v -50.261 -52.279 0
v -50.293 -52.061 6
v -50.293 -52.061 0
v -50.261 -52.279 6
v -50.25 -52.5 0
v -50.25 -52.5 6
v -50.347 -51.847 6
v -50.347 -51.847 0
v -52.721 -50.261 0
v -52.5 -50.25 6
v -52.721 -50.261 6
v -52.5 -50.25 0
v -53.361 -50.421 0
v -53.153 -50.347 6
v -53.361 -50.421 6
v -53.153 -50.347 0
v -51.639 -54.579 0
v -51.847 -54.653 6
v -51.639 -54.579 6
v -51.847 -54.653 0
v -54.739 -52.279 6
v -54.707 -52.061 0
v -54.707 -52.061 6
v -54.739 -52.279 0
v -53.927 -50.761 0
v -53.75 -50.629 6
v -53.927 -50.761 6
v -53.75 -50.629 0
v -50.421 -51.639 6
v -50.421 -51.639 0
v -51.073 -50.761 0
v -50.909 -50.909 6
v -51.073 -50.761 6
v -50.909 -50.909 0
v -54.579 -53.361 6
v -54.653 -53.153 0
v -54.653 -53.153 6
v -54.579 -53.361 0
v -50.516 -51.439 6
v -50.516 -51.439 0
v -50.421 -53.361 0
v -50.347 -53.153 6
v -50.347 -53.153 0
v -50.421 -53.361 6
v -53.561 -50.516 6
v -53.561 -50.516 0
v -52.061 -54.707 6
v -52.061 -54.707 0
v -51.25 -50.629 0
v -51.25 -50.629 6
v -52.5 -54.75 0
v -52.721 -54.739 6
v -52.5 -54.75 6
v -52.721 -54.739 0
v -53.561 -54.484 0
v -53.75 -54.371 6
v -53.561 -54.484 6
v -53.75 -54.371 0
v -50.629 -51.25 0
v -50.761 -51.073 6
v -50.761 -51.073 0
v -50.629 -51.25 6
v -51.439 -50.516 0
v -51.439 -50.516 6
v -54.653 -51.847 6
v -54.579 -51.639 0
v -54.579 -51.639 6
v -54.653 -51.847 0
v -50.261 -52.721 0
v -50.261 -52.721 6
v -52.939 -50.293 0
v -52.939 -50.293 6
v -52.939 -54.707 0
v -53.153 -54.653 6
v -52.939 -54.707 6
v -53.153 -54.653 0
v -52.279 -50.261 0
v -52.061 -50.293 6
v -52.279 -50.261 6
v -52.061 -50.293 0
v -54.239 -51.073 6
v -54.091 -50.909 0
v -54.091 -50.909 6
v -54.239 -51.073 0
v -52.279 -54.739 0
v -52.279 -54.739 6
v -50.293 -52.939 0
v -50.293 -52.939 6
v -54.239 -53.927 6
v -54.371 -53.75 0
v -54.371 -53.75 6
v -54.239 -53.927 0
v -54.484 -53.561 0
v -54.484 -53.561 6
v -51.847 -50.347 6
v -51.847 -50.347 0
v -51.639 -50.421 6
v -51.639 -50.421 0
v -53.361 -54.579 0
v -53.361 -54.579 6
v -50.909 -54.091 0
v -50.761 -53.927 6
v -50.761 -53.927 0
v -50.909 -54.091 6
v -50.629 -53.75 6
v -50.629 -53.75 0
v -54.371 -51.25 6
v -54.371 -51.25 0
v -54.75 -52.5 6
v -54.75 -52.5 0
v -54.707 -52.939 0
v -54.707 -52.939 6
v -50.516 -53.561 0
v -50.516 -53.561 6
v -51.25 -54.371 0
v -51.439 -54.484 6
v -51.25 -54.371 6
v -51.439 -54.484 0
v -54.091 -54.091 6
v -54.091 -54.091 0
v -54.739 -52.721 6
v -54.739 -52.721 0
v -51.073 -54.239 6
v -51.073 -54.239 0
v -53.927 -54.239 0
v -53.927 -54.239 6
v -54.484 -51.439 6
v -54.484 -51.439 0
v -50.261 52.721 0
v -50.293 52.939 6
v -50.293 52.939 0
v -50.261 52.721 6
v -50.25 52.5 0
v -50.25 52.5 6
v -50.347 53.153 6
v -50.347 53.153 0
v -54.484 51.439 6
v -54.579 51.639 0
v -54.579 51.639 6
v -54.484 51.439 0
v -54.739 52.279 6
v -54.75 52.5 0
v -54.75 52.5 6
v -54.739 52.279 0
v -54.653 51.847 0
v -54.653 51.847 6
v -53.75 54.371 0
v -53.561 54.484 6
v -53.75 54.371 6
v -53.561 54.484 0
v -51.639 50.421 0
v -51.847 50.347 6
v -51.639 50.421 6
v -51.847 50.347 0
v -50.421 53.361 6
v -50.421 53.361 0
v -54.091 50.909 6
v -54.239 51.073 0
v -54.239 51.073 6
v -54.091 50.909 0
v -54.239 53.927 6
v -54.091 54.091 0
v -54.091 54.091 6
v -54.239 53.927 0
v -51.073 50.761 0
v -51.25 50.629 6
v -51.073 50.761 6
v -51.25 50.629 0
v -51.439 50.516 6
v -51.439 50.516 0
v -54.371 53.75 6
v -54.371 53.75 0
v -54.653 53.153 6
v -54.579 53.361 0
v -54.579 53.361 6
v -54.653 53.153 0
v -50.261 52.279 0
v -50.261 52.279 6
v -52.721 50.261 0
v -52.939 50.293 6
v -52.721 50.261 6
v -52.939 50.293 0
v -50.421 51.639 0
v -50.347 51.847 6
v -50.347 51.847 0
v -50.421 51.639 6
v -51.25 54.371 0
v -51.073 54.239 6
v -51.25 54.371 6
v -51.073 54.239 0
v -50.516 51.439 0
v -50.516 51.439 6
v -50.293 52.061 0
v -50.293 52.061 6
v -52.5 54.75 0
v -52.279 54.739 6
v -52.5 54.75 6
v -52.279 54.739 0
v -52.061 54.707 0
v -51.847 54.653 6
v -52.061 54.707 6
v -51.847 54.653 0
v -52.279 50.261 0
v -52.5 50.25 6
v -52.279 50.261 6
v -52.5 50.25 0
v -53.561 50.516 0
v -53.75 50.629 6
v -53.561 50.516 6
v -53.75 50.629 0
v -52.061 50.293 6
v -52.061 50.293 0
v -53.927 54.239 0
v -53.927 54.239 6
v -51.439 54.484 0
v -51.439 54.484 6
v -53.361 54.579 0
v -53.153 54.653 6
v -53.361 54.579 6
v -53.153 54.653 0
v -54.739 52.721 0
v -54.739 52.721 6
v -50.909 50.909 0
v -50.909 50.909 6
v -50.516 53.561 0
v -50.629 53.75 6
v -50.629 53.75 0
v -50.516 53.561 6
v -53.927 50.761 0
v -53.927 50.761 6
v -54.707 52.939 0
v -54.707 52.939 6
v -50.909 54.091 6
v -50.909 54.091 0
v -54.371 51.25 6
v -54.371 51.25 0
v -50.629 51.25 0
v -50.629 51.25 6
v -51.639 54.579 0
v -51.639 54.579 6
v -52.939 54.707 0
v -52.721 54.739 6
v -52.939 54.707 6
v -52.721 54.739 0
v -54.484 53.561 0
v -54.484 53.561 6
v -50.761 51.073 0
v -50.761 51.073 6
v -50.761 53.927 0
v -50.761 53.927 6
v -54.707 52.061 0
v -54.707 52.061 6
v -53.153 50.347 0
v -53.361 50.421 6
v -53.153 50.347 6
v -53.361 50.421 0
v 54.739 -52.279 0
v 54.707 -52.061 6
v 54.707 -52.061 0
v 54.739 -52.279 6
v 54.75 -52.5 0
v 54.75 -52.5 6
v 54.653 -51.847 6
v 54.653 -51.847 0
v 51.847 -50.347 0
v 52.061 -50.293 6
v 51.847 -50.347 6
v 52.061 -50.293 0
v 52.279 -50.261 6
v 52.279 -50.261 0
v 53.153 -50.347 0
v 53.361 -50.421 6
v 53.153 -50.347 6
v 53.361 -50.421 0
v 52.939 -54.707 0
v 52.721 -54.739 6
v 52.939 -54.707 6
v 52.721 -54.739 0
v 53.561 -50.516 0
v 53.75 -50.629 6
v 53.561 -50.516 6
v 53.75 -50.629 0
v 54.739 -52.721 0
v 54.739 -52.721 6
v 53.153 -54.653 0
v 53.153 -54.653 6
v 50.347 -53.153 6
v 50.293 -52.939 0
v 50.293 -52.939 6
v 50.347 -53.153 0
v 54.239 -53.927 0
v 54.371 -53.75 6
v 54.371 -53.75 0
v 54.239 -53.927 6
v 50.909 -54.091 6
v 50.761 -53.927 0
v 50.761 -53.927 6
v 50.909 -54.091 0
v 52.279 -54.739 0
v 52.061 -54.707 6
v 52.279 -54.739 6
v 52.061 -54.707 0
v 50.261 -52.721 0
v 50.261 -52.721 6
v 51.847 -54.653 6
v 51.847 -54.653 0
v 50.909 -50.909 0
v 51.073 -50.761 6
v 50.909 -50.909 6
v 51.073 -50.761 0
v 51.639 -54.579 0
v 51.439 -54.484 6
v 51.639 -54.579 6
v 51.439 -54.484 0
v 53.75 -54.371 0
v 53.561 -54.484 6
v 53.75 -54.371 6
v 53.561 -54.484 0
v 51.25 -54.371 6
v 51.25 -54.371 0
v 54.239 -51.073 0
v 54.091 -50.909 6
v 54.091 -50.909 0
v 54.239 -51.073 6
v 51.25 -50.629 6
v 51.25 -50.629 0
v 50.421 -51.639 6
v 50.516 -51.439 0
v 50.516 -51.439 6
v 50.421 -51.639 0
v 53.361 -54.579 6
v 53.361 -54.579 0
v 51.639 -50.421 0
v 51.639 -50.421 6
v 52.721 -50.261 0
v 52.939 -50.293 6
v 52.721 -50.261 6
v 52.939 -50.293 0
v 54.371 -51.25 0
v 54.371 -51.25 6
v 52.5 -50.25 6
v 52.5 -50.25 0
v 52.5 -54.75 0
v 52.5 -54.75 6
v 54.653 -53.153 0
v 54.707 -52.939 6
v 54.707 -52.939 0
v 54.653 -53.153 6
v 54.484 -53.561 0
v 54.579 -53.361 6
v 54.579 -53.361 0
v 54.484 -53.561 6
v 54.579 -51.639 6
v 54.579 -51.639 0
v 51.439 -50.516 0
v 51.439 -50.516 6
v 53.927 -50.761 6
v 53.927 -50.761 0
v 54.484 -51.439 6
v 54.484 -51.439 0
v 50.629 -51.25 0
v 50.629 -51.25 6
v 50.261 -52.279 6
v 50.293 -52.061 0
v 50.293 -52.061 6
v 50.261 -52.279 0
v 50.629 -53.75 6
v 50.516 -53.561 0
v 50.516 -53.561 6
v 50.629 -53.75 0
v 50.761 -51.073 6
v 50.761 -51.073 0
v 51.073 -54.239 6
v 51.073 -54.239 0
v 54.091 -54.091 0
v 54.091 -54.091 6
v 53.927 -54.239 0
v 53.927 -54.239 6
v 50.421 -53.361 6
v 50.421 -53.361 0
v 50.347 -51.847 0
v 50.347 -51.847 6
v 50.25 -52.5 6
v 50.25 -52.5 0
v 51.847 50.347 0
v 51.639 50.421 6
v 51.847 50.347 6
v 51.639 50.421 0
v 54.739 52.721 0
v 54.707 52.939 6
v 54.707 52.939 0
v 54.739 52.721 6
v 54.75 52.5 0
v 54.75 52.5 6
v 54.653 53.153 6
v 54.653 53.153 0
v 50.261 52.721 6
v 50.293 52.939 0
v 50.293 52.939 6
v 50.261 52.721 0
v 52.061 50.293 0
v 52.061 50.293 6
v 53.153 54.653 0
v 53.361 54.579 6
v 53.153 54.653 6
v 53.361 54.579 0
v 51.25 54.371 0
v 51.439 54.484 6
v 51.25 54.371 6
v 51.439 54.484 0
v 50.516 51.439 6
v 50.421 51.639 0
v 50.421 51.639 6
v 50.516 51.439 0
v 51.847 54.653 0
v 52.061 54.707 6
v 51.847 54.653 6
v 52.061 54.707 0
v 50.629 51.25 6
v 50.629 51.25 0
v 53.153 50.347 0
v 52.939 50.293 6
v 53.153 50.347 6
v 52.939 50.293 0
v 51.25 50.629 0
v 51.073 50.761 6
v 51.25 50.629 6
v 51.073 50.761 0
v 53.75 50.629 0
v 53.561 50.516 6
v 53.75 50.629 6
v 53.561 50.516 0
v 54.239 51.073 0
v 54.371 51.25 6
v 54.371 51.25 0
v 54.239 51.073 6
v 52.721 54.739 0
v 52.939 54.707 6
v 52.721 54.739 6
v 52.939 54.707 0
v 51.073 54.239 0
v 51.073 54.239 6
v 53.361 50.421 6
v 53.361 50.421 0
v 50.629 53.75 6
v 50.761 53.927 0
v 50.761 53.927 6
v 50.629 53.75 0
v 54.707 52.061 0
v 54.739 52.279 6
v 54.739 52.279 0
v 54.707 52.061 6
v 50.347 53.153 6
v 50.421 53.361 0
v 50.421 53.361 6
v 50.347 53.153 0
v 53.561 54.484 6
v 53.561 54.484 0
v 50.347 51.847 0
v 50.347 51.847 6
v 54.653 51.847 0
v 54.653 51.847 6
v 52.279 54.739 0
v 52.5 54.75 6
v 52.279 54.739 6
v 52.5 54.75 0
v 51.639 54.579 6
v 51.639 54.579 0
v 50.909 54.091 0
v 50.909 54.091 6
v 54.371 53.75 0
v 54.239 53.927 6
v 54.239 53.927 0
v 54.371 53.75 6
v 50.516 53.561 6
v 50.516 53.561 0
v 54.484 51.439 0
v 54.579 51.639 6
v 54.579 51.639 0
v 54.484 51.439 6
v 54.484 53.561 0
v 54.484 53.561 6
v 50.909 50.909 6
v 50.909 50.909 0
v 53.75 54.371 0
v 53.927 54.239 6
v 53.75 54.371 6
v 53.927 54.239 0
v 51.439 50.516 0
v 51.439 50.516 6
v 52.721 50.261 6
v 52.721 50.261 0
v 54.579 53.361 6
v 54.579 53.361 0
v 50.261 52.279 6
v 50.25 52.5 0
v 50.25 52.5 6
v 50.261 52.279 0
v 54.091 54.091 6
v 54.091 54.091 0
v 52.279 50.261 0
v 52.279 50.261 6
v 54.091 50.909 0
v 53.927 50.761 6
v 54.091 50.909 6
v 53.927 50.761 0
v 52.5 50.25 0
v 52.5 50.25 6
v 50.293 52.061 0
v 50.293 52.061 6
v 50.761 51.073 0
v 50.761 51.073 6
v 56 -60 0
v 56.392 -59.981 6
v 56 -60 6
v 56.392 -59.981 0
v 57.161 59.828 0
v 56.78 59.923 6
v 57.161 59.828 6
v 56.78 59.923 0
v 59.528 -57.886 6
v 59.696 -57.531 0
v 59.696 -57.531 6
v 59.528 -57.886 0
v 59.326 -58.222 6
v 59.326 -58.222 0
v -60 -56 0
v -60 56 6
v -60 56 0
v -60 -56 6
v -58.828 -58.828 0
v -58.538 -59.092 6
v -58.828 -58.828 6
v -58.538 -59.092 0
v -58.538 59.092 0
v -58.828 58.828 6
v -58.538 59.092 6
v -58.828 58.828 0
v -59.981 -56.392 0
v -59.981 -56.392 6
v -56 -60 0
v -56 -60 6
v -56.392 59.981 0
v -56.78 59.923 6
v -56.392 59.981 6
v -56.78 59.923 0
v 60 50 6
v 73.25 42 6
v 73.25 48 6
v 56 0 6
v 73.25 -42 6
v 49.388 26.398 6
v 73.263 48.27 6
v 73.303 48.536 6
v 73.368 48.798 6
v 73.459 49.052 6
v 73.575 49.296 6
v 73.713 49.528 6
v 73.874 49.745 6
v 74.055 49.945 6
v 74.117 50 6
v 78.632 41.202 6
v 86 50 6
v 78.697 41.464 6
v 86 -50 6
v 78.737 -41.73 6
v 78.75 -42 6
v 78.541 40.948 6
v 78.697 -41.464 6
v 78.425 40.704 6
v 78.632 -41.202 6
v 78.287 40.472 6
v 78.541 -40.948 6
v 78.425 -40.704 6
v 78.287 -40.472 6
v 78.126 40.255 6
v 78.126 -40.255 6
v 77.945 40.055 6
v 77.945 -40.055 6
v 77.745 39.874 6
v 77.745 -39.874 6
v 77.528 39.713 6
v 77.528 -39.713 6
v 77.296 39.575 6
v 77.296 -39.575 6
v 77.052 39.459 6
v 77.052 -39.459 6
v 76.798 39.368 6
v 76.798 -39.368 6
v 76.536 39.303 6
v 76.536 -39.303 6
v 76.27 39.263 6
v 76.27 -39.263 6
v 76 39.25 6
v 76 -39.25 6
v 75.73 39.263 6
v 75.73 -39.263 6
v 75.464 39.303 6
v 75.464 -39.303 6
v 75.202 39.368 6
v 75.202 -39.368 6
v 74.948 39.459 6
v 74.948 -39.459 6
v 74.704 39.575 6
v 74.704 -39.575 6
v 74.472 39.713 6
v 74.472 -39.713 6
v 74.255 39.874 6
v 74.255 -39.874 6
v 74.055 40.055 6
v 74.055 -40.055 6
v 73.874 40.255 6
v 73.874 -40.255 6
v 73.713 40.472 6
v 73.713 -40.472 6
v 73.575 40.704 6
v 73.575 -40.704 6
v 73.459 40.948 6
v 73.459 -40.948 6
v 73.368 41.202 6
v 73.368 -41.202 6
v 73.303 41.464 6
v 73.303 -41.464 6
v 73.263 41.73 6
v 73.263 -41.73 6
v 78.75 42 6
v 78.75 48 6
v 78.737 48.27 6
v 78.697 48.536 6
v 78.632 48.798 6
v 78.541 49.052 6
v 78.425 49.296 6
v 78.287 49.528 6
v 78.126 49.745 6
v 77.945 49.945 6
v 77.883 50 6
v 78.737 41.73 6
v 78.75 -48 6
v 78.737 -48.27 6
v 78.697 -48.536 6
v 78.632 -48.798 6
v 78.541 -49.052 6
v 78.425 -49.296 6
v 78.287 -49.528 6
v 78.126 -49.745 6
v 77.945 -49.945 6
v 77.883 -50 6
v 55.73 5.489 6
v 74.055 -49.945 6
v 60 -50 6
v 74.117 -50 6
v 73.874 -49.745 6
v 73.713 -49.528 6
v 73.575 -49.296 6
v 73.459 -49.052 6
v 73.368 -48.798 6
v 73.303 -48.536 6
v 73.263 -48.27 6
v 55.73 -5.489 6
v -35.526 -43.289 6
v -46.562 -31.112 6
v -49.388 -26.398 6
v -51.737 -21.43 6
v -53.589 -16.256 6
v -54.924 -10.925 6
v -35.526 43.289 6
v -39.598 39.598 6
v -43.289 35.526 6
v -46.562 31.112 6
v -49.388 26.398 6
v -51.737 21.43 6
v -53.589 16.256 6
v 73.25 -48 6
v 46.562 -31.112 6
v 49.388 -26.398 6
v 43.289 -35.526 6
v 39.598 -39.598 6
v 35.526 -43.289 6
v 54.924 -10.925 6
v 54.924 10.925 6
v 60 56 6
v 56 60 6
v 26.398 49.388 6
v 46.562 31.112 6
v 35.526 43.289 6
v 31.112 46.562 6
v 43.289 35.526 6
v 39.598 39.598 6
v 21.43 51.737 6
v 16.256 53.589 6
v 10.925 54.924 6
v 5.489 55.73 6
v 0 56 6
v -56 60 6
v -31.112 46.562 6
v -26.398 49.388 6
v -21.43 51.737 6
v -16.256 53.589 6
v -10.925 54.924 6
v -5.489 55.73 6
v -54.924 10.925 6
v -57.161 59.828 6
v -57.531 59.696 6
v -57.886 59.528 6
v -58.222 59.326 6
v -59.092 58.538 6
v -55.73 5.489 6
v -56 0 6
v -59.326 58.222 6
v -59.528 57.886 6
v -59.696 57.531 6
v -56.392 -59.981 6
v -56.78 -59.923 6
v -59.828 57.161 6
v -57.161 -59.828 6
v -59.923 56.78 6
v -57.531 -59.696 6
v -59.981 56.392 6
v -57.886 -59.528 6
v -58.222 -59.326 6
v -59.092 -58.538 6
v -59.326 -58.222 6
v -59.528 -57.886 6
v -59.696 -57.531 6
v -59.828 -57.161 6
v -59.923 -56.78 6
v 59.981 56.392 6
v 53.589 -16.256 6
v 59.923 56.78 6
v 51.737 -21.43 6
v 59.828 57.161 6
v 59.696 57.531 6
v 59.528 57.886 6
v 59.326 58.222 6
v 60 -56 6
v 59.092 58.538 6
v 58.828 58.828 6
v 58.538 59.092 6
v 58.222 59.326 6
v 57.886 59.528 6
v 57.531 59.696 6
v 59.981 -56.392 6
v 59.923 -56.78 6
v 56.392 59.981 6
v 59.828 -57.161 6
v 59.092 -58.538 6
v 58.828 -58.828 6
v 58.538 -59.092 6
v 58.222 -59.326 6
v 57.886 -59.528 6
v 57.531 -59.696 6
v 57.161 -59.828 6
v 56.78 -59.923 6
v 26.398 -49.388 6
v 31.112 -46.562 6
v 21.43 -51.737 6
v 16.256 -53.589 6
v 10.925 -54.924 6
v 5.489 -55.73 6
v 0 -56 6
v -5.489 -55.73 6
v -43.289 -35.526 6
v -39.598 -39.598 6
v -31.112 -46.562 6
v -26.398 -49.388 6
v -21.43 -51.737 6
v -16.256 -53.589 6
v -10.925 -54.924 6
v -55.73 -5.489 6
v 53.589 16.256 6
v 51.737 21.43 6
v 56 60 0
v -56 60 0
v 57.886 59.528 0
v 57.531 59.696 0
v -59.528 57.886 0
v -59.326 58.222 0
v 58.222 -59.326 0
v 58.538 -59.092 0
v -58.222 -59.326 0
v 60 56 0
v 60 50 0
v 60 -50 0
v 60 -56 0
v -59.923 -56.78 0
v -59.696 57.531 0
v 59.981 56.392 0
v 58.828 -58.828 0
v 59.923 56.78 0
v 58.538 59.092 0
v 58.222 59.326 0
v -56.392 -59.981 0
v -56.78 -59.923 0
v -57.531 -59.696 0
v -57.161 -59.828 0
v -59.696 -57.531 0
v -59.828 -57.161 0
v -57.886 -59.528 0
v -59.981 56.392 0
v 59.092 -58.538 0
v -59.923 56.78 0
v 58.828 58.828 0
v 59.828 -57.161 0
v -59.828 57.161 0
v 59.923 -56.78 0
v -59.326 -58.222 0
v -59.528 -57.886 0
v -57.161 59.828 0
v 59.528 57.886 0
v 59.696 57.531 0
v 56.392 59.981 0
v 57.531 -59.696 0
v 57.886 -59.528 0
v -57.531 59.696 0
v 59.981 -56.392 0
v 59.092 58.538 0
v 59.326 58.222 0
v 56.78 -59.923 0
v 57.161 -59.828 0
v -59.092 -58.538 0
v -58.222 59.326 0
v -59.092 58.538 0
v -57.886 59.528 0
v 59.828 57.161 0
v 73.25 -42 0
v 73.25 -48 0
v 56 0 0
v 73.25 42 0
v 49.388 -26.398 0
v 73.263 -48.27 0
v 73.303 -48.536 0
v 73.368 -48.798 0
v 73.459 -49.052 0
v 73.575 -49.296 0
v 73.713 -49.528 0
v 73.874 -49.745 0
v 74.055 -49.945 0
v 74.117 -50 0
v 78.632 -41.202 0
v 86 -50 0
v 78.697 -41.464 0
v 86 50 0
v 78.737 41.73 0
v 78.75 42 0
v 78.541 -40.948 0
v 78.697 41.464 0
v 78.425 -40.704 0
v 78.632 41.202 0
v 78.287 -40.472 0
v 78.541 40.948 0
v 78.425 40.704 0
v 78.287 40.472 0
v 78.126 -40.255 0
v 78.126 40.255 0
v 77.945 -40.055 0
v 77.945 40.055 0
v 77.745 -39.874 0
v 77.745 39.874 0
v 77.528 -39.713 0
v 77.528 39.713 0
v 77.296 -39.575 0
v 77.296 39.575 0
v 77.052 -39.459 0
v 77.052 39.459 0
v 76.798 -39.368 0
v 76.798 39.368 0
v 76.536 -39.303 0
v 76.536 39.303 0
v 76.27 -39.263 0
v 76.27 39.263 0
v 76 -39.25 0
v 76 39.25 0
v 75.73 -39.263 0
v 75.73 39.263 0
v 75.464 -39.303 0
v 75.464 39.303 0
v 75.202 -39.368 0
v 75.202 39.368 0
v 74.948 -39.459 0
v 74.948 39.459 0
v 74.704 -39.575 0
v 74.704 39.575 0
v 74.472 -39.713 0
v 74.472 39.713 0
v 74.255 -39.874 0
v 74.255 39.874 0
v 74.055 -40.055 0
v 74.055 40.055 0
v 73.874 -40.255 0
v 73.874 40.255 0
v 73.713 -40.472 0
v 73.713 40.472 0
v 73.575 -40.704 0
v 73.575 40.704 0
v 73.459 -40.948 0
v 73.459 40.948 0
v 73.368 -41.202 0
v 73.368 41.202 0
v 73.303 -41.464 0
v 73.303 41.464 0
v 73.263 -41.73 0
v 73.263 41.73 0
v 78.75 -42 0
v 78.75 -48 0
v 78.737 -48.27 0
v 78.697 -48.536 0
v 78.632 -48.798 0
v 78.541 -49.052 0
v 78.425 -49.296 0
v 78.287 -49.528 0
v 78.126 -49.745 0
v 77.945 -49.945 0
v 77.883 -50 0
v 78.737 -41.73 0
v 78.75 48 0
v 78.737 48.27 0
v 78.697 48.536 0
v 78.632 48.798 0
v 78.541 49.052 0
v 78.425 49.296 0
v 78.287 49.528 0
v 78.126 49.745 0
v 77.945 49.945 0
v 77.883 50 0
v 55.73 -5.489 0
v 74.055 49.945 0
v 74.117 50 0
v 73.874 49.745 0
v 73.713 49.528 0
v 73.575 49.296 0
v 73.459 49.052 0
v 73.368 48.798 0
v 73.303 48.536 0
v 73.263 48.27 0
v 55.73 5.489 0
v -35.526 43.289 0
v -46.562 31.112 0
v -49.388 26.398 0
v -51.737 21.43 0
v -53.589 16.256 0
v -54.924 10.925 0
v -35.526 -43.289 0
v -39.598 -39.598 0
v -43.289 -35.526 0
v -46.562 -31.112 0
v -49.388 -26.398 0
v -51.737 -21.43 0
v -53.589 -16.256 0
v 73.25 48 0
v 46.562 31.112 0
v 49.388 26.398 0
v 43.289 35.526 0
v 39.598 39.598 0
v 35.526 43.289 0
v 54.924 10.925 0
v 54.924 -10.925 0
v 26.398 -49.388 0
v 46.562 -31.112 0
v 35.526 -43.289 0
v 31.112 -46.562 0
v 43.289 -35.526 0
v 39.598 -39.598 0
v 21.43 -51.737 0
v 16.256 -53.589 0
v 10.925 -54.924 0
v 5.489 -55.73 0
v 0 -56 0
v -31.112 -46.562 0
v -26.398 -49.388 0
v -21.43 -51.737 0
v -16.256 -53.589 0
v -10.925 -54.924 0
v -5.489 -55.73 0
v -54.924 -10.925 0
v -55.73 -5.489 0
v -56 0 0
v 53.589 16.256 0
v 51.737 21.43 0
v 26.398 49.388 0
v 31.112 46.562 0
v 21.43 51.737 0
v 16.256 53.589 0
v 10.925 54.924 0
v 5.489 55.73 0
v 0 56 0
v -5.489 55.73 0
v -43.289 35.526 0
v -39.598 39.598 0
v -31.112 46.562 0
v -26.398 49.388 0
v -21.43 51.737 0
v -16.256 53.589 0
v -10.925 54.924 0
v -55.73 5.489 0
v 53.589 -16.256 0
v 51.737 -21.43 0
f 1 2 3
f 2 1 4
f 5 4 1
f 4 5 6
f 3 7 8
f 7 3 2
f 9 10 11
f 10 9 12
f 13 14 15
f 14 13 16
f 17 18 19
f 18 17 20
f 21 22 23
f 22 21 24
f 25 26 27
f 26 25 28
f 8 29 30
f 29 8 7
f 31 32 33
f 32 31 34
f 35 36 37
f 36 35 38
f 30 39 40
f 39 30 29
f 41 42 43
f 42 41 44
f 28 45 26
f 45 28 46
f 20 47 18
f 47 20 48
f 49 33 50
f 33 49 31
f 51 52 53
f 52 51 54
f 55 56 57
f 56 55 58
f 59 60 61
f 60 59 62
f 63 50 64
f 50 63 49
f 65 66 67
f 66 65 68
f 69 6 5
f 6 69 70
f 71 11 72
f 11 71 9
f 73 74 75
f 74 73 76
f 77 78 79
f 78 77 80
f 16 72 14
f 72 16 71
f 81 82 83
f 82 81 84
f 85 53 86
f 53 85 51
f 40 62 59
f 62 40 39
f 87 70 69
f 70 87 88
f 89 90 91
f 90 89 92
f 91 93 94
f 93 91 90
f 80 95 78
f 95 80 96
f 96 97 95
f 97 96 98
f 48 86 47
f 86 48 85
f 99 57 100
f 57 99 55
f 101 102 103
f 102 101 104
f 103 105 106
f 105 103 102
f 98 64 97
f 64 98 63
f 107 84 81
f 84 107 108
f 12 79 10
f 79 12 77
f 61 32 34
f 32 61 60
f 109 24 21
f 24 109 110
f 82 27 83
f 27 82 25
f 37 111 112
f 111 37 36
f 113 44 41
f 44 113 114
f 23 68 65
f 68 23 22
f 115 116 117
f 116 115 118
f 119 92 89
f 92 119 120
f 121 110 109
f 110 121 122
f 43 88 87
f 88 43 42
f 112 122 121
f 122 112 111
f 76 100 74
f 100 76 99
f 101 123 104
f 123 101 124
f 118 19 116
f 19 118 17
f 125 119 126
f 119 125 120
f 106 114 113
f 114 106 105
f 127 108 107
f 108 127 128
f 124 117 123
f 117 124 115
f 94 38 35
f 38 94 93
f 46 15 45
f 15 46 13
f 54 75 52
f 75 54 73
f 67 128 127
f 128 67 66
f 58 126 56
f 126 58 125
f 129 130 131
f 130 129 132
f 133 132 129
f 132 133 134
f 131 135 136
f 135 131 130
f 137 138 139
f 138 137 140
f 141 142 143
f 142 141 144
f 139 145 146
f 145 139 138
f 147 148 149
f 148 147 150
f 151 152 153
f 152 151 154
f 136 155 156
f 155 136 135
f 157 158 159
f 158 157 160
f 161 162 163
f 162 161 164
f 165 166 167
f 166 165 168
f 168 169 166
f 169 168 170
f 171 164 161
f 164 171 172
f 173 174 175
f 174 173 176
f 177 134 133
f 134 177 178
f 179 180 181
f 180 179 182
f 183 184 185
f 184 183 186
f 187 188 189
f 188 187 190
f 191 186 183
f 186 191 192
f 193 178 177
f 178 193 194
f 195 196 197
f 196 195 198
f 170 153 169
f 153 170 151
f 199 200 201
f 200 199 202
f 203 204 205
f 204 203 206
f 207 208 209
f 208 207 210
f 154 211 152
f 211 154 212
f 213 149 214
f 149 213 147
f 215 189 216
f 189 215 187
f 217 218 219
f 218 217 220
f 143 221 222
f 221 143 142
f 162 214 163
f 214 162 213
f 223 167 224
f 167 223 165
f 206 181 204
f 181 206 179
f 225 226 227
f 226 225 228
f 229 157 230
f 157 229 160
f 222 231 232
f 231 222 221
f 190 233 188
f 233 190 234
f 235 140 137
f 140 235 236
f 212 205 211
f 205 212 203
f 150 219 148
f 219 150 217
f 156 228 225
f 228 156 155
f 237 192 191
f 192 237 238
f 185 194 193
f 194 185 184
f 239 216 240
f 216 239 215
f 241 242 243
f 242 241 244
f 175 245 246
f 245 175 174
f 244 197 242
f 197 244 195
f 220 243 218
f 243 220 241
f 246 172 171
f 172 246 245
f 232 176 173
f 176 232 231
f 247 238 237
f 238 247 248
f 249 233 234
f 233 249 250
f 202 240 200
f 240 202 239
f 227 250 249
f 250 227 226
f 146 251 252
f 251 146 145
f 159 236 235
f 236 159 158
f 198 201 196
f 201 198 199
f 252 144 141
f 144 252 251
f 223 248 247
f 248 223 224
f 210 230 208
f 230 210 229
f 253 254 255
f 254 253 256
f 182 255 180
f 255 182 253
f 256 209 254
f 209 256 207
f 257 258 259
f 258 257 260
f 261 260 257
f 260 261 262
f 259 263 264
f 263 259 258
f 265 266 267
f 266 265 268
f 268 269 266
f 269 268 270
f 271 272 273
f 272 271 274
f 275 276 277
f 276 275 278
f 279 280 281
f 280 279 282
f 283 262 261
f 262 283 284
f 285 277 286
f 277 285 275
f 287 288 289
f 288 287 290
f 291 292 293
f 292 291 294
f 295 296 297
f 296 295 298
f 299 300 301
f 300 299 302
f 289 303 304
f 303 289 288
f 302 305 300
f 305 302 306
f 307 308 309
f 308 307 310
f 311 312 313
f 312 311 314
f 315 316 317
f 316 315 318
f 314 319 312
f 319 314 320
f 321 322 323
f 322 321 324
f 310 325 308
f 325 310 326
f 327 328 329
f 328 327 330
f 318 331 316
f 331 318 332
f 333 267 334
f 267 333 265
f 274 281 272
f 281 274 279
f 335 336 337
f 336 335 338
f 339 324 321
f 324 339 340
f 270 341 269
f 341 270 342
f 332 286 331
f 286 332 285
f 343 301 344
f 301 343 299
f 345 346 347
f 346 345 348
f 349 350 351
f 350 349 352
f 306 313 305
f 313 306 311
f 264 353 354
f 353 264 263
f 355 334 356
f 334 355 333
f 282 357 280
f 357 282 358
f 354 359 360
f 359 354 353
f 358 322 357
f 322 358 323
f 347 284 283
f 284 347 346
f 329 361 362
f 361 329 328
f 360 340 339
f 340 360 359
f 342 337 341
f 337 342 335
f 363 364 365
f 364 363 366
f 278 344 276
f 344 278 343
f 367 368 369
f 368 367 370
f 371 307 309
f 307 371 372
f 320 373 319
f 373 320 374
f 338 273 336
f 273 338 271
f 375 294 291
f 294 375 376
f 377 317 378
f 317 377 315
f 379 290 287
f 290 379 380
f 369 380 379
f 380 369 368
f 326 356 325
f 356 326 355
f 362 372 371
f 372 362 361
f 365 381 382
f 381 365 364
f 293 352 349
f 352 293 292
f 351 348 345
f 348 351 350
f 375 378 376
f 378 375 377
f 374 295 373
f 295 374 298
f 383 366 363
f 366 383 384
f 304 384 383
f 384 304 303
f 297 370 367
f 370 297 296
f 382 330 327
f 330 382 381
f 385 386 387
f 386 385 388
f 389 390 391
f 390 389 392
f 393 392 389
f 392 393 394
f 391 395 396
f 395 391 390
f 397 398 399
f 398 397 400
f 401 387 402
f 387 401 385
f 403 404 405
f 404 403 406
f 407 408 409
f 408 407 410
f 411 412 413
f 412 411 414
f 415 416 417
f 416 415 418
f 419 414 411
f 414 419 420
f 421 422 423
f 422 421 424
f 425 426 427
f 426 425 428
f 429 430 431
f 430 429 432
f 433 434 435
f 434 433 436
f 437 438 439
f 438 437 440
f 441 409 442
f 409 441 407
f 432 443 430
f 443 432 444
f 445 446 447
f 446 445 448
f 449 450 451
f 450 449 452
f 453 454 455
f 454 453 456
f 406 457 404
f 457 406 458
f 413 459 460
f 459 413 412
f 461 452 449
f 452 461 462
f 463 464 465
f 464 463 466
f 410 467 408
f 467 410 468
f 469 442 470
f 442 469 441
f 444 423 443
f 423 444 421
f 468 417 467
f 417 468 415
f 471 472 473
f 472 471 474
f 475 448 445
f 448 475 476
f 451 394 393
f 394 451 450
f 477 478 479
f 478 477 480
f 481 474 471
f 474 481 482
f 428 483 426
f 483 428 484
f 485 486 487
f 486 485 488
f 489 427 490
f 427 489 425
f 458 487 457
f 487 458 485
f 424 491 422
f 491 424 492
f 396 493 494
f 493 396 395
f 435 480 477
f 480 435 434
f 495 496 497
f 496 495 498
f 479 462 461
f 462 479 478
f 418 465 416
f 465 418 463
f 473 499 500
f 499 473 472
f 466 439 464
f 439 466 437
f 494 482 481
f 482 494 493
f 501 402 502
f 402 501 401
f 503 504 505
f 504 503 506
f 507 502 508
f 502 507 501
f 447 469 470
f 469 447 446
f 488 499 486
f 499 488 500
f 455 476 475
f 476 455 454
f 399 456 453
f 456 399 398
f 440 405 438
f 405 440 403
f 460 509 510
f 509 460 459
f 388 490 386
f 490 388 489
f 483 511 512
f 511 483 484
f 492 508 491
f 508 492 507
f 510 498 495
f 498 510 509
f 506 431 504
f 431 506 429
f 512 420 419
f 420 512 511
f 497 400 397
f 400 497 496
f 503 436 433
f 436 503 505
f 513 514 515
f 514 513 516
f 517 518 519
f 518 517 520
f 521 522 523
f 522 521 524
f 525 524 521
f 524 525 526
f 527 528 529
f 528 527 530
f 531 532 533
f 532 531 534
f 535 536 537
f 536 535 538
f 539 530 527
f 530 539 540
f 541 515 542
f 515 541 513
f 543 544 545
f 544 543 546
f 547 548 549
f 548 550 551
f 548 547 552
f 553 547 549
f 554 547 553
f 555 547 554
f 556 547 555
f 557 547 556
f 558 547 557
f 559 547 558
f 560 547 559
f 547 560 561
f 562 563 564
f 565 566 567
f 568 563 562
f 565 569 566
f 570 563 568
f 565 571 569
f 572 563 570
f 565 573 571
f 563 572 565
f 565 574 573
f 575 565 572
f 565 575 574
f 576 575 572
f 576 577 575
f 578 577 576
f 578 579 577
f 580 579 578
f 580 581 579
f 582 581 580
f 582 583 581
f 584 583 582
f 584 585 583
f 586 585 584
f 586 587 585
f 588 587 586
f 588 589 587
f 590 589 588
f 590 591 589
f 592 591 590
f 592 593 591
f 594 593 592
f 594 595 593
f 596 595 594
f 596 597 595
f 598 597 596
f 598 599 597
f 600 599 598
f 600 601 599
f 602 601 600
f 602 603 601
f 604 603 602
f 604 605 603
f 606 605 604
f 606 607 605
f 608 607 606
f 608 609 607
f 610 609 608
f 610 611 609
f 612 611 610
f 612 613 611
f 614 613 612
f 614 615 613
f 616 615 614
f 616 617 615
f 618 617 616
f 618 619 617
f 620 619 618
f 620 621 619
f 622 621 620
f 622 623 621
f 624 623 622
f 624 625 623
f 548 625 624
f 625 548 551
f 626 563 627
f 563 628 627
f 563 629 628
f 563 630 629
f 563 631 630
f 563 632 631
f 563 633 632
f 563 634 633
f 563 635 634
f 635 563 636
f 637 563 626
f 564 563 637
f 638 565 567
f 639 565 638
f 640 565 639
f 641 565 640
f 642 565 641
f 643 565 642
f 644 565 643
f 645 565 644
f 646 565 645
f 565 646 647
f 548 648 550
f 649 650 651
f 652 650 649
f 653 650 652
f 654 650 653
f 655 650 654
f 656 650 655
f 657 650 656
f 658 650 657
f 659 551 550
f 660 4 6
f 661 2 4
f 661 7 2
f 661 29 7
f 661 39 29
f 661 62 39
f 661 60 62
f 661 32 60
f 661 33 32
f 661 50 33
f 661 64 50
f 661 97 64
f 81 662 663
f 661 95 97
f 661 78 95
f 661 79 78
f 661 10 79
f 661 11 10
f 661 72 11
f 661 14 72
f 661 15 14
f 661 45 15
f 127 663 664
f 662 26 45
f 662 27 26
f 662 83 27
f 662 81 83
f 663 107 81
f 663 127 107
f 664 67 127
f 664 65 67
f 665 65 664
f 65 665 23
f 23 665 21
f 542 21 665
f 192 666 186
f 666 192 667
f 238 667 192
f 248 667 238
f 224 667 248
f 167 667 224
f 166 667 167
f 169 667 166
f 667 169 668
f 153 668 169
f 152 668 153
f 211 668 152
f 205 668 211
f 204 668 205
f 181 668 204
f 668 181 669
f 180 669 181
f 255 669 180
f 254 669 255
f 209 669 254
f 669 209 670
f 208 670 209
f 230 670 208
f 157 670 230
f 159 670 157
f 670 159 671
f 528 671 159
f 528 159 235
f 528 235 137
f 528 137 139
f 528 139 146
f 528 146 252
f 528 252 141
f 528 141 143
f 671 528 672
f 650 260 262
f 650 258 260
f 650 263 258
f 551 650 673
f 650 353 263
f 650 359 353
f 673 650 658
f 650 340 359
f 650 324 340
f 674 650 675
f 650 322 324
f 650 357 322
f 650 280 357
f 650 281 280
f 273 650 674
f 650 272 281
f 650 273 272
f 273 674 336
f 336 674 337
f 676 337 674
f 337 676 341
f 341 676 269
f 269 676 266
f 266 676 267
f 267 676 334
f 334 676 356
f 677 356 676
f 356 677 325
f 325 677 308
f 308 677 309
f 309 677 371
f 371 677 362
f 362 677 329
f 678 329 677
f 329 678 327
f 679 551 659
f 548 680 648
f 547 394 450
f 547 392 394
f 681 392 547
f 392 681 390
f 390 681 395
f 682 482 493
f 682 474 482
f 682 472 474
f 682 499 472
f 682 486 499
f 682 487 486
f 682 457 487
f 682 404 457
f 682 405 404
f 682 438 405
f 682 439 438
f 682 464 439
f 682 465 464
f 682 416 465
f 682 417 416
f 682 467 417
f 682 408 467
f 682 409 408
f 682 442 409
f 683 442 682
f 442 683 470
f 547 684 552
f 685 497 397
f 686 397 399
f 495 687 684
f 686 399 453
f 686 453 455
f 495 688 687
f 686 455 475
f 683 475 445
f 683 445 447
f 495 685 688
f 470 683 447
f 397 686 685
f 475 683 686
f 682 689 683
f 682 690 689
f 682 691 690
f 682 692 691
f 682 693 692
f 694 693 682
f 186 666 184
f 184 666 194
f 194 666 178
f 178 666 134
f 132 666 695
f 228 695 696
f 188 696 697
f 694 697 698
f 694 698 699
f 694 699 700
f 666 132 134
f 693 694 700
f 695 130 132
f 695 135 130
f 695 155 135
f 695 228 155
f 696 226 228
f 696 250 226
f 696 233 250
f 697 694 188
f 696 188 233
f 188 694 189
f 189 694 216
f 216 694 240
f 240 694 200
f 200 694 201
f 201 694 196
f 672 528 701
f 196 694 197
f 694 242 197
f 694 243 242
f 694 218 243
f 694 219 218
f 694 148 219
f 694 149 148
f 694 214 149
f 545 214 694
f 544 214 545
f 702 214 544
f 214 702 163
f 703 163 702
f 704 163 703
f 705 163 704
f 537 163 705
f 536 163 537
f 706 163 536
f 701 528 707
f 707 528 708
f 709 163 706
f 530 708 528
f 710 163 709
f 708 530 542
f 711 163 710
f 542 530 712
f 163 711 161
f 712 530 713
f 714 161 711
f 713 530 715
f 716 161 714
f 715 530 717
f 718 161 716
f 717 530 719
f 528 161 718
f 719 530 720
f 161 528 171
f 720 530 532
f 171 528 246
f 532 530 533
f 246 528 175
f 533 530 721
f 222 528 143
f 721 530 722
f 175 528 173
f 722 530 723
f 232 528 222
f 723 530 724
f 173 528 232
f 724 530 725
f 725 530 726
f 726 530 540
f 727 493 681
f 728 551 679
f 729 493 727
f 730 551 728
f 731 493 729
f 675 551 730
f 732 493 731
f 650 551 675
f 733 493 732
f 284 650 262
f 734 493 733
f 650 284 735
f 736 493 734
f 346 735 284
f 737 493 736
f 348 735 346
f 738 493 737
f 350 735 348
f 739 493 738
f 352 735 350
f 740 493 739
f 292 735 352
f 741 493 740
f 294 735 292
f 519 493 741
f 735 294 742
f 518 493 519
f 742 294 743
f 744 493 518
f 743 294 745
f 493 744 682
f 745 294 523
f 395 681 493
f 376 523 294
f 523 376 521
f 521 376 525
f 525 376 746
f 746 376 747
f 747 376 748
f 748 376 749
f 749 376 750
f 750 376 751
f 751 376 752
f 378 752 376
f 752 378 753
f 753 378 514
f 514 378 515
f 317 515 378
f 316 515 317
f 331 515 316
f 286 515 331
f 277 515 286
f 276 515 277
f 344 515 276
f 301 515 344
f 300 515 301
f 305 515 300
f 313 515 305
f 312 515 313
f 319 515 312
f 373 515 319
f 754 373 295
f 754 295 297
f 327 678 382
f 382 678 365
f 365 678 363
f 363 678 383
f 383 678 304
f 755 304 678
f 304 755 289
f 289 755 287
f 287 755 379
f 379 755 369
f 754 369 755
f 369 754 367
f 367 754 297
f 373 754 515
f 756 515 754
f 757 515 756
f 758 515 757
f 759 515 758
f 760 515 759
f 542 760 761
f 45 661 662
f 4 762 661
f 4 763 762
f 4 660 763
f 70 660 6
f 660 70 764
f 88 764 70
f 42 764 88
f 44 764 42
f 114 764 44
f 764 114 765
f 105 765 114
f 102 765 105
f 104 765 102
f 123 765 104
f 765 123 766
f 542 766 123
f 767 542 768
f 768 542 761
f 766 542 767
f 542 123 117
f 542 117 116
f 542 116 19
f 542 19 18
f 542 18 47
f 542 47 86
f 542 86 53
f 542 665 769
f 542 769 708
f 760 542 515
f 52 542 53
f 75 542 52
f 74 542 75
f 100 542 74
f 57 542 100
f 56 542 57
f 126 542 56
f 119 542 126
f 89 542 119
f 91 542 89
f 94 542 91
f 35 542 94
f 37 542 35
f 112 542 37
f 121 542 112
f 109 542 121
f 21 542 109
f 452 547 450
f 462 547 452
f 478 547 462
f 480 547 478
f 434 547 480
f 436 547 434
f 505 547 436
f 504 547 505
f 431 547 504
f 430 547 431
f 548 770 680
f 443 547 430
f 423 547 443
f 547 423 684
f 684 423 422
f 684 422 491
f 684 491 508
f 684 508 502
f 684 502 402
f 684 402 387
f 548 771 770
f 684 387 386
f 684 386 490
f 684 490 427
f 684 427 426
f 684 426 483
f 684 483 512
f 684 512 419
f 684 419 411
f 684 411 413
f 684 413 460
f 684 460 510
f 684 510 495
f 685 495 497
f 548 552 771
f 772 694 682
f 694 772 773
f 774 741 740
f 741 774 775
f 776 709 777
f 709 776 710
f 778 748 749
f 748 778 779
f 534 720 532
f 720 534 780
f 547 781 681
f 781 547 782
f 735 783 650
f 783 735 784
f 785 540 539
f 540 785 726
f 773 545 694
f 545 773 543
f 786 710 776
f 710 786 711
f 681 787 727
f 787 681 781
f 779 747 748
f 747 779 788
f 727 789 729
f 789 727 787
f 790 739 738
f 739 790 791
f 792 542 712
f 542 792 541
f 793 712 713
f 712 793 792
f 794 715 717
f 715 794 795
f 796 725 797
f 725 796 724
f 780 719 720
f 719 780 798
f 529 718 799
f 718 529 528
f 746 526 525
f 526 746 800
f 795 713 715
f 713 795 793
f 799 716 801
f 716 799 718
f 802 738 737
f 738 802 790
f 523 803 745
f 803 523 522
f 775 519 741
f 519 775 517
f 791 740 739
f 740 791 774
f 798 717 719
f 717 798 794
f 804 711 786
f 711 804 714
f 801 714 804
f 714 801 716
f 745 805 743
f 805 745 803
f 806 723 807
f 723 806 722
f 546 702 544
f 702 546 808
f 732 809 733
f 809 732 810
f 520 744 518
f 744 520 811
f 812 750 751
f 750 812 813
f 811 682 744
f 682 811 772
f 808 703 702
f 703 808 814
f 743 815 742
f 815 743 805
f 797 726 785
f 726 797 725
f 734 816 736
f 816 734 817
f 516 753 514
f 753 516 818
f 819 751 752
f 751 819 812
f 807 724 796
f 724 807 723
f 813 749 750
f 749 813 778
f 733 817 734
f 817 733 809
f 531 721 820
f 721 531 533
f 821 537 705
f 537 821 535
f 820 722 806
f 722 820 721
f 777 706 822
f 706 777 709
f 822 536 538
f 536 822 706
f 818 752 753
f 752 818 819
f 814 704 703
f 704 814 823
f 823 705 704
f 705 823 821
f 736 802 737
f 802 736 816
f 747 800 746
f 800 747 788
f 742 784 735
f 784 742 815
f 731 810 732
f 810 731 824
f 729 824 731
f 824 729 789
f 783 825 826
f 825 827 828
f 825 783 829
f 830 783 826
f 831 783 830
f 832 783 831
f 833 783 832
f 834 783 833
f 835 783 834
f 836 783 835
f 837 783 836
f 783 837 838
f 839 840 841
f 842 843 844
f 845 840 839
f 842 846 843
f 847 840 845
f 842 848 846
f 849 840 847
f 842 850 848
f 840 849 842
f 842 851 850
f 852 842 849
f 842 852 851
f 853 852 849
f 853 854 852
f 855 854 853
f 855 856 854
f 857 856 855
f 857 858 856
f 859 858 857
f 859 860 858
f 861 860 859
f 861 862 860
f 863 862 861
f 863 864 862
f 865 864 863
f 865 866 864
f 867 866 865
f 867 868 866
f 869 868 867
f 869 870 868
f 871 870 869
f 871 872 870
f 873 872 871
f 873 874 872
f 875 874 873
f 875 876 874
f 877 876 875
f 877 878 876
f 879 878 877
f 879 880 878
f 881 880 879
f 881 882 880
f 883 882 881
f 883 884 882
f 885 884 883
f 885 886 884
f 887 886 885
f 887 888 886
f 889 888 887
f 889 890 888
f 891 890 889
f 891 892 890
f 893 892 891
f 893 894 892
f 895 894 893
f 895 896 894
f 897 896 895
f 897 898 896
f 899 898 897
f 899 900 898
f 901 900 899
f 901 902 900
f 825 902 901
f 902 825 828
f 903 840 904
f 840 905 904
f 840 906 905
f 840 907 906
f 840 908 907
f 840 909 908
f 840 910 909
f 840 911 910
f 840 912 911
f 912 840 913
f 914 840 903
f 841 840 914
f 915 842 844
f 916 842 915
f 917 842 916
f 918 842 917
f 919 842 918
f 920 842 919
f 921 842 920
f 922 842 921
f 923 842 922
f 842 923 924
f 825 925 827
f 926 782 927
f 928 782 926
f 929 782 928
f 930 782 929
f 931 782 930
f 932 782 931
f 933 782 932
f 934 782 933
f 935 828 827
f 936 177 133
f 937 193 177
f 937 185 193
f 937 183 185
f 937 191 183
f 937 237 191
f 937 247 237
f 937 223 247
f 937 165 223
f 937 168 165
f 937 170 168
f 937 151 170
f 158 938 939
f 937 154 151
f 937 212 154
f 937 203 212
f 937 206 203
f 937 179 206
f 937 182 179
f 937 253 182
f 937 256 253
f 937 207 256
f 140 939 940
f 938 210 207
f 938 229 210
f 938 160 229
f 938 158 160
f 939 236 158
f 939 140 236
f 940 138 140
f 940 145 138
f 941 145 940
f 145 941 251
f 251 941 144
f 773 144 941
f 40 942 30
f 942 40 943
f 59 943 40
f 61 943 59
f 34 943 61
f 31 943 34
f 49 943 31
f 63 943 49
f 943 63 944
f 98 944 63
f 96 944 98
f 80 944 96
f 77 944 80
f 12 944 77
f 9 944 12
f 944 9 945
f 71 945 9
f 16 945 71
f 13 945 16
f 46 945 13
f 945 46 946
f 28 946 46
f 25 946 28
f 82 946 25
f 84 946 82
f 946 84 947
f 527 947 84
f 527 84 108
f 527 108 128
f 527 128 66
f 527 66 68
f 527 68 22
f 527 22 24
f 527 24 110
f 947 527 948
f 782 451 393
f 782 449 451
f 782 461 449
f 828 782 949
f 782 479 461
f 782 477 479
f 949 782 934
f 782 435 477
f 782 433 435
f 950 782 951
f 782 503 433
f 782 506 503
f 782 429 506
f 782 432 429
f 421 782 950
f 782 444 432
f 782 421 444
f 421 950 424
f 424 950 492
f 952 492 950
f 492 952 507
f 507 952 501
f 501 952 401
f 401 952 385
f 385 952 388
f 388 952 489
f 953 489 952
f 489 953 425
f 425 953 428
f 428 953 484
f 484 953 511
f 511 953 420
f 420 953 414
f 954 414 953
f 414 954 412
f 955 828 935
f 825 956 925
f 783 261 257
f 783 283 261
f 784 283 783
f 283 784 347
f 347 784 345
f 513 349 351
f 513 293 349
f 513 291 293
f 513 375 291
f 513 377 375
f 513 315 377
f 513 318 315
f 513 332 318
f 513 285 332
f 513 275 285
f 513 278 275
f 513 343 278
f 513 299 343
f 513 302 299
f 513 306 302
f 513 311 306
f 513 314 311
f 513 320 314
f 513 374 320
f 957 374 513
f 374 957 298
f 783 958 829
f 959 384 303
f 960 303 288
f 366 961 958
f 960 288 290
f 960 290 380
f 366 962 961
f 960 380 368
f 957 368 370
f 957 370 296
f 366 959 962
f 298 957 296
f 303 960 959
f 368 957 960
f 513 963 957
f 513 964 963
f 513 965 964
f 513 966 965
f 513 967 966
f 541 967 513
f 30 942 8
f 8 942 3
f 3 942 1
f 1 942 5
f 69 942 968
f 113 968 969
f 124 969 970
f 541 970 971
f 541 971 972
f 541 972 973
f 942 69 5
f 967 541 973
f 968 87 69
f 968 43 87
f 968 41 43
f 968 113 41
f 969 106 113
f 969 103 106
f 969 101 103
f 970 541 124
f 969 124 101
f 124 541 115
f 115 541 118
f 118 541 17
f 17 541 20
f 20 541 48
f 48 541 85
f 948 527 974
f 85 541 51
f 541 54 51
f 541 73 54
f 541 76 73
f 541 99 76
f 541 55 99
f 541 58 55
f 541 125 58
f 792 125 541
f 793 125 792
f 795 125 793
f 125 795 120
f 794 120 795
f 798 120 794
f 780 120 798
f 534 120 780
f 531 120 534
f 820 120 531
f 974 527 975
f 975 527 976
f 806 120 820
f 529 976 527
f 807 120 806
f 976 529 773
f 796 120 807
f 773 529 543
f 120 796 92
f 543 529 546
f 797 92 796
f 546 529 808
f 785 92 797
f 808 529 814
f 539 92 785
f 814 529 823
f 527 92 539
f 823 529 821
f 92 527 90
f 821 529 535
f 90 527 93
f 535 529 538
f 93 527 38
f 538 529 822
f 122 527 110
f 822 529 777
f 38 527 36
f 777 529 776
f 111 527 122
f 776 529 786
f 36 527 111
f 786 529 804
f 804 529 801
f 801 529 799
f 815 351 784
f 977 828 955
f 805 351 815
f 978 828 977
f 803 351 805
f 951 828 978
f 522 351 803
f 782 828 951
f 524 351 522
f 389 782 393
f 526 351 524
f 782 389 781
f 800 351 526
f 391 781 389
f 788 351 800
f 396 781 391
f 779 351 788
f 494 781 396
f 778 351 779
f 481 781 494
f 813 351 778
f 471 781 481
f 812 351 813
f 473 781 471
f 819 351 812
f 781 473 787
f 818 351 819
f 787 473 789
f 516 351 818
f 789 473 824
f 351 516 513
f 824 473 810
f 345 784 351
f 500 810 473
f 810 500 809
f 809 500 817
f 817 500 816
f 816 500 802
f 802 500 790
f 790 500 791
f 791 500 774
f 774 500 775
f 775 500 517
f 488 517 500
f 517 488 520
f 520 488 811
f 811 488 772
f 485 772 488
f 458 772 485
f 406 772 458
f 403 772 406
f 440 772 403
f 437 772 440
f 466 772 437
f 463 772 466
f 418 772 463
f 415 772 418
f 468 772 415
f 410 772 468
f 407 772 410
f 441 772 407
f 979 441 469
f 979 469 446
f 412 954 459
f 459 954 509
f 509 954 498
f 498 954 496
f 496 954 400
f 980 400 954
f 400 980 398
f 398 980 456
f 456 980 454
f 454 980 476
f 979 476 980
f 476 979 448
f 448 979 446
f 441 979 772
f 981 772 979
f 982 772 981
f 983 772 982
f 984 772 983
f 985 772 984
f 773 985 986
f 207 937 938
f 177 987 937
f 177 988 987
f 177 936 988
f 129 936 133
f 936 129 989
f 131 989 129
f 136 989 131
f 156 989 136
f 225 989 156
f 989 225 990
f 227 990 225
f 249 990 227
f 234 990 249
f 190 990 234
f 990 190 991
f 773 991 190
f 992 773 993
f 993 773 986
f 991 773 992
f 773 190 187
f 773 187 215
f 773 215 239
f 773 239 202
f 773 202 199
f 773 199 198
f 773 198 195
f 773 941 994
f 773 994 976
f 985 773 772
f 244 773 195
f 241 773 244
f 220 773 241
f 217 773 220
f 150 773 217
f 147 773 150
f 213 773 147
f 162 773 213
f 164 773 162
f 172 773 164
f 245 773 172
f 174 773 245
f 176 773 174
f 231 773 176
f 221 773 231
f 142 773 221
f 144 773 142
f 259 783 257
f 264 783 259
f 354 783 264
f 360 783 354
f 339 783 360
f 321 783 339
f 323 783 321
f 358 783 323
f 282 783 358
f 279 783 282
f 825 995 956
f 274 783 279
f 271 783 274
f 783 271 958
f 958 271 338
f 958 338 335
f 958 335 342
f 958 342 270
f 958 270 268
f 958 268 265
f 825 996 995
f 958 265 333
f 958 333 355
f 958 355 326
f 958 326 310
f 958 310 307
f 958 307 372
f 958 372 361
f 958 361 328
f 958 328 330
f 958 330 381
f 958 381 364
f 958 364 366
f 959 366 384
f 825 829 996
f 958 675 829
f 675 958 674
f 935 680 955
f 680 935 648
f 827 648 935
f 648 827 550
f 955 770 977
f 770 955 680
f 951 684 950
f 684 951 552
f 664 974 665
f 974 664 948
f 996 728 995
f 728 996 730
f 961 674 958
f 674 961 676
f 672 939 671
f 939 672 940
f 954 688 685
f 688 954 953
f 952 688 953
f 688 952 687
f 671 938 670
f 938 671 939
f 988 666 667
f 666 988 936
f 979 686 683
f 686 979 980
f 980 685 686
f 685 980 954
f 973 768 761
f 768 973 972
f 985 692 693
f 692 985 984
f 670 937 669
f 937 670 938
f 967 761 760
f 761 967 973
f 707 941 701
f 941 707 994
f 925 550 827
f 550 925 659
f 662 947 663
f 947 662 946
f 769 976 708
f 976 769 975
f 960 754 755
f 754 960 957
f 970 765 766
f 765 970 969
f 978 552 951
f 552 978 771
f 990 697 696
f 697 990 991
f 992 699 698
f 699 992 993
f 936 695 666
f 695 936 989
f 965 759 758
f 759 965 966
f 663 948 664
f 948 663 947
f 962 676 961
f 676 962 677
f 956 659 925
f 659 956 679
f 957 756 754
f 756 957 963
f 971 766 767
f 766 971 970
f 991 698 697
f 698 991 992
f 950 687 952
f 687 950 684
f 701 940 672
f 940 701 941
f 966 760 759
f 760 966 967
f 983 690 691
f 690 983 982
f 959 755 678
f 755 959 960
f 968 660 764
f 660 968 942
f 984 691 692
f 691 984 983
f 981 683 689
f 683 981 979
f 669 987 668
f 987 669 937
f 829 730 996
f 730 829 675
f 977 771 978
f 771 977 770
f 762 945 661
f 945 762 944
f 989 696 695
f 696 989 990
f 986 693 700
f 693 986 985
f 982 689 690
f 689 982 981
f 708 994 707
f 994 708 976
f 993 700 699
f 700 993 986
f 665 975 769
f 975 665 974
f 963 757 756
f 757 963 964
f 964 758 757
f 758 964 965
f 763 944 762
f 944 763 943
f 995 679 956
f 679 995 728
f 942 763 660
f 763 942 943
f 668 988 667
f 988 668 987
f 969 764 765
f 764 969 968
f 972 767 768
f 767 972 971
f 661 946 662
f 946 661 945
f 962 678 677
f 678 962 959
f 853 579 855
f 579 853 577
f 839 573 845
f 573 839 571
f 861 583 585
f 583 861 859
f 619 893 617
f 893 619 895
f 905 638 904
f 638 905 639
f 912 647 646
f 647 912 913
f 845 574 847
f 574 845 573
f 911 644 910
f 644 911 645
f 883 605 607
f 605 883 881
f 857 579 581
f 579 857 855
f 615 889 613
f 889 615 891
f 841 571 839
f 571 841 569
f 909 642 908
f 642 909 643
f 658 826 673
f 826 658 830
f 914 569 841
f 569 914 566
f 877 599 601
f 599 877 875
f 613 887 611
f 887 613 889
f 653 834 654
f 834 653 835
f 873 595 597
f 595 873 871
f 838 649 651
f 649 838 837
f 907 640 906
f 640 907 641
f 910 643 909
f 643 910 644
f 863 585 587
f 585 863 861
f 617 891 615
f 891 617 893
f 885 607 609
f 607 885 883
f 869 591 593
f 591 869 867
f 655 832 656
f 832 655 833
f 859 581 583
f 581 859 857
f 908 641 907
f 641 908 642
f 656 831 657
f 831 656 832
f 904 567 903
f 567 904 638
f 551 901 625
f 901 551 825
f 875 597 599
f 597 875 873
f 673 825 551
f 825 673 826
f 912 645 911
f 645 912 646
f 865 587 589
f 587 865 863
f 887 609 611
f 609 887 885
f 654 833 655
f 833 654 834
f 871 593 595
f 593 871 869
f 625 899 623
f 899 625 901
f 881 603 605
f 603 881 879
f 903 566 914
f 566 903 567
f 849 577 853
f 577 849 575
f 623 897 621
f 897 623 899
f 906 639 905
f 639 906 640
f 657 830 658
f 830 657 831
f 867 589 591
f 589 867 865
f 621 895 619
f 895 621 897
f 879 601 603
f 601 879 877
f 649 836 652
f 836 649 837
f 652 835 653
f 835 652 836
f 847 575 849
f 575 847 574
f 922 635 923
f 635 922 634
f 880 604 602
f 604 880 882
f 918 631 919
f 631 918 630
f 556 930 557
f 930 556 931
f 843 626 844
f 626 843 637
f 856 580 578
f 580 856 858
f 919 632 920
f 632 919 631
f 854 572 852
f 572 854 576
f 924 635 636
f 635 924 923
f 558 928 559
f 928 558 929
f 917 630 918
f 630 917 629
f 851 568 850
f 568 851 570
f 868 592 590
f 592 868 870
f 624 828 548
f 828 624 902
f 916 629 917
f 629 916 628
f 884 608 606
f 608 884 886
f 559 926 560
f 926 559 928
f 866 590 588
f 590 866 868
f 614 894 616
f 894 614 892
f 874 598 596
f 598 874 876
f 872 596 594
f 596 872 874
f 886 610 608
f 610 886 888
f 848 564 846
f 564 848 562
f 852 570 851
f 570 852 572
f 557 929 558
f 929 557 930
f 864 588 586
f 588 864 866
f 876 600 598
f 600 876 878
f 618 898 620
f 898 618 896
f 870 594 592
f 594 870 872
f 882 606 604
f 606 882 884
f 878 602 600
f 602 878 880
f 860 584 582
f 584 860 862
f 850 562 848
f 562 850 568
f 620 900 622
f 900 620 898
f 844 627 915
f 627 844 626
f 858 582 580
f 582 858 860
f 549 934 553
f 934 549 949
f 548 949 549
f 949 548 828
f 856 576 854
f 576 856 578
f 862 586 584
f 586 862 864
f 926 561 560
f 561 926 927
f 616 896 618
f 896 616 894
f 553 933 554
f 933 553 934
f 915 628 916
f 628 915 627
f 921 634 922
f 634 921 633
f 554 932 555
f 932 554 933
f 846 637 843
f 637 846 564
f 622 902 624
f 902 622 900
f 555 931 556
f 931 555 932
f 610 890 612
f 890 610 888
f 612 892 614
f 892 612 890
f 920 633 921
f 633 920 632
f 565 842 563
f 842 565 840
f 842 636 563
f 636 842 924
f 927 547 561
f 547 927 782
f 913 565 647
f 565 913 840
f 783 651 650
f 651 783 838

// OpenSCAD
// file: config.scad
// ============================================================
//  config.scad — shared dimensions (single source of truth)
//  Every other file includes this. Change a number here and
//  the part files AND the assembly update together.
//  Units: mm.  Z is up.
// ============================================================

/* ----- rack ----- */
U       = 44.45;
span_U  = 6;
span    = span_U * U;        // 266.7 — spine length / mount span
post_t  = 4;
post_w  = 25;

/* ----- fan ----- */
fan_size  = 120;
fan_thick = 25;
fan_pitch = 105;
fan_hole_d = 4.5;            // M4 clearance (anti-vibration washers under the head)
bore_d    = 112;

/* ----- carrier ----- */
thickness       = 6;         // one thickness -> flat part (print or waterjet/CNC)
frame_corner_r  = 4;
gap_to_spine    = 6;
mount_bolt_d    = 5.5;       // M5 clearance into T-nuts
mount_bolt_span = 90;
slot_travel     = 6;
flange_height   = 100;

/* ----- spine (2020) ----- */
ext_width  = 20;

/* ----- fan heights along the rail ----- */
fan1_z = fan_size/2 + 5;
fan2_z = span - fan_size/2 - 5;

/* ----- derived placement (shared by carrier + spine + bracket) ----- */
spine_face_x   = fan_size/2 + gap_to_spine;   // 66
spine_center_x = spine_face_x + ext_width/2;  // 76
wing_x0        = fan_size/2 - 4;              // 56
wing_x1        = spine_face_x + ext_width;    // 86
post_x         = wing_x1 + 12;                // 98 (post inner face)

$fn = 64;
eps = 0.01;
// main file
// ============================================================
//  fan_carrier.scad — the part you fabricate (one per fan)
//  Flat profile: open frame + side wing. Print it, or cut from
//  sheet. Renders standalone here; the assembly `use`s carrier().
// ============================================================
include <config.scad>

module fan_frame() {
    difference() {
        linear_extrude(thickness)
            offset(r = frame_corner_r)
                square(fan_size - 2*frame_corner_r, center = true);
        translate([0, 0, -eps])
            cylinder(h = thickness + 2*eps, d = bore_d);
        for (sx = [-1, 1], sy = [-1, 1])
            translate([sx*fan_pitch/2, sy*fan_pitch/2, -eps])
                cylinder(h = thickness + 2*eps, d = fan_hole_d);
    }
}

module mount_wing() {
    difference() {
        translate([wing_x0, -flange_height/2, 0])
            cube([wing_x1 - wing_x0, flange_height, thickness]);
        for (sy = [-1, 1])
            translate([spine_center_x, sy*mount_bolt_span/2, -eps])
                hull() for (dy = [-slot_travel/2, slot_travel/2])
                    translate([0, dy, 0])
                        cylinder(h = thickness + 2*eps, d = mount_bolt_d);
    }
}

// s = "right" or "left" (mirror for the other rail)
module carrier(s = "right") {
    color("DarkOrange")
        scale([(s == "right") ? 1 : -1, 1, 1])
            union() { fan_frame(); mount_wing(); }
}

carrier();   // standalone preview (ignored when this file is `use`d)
